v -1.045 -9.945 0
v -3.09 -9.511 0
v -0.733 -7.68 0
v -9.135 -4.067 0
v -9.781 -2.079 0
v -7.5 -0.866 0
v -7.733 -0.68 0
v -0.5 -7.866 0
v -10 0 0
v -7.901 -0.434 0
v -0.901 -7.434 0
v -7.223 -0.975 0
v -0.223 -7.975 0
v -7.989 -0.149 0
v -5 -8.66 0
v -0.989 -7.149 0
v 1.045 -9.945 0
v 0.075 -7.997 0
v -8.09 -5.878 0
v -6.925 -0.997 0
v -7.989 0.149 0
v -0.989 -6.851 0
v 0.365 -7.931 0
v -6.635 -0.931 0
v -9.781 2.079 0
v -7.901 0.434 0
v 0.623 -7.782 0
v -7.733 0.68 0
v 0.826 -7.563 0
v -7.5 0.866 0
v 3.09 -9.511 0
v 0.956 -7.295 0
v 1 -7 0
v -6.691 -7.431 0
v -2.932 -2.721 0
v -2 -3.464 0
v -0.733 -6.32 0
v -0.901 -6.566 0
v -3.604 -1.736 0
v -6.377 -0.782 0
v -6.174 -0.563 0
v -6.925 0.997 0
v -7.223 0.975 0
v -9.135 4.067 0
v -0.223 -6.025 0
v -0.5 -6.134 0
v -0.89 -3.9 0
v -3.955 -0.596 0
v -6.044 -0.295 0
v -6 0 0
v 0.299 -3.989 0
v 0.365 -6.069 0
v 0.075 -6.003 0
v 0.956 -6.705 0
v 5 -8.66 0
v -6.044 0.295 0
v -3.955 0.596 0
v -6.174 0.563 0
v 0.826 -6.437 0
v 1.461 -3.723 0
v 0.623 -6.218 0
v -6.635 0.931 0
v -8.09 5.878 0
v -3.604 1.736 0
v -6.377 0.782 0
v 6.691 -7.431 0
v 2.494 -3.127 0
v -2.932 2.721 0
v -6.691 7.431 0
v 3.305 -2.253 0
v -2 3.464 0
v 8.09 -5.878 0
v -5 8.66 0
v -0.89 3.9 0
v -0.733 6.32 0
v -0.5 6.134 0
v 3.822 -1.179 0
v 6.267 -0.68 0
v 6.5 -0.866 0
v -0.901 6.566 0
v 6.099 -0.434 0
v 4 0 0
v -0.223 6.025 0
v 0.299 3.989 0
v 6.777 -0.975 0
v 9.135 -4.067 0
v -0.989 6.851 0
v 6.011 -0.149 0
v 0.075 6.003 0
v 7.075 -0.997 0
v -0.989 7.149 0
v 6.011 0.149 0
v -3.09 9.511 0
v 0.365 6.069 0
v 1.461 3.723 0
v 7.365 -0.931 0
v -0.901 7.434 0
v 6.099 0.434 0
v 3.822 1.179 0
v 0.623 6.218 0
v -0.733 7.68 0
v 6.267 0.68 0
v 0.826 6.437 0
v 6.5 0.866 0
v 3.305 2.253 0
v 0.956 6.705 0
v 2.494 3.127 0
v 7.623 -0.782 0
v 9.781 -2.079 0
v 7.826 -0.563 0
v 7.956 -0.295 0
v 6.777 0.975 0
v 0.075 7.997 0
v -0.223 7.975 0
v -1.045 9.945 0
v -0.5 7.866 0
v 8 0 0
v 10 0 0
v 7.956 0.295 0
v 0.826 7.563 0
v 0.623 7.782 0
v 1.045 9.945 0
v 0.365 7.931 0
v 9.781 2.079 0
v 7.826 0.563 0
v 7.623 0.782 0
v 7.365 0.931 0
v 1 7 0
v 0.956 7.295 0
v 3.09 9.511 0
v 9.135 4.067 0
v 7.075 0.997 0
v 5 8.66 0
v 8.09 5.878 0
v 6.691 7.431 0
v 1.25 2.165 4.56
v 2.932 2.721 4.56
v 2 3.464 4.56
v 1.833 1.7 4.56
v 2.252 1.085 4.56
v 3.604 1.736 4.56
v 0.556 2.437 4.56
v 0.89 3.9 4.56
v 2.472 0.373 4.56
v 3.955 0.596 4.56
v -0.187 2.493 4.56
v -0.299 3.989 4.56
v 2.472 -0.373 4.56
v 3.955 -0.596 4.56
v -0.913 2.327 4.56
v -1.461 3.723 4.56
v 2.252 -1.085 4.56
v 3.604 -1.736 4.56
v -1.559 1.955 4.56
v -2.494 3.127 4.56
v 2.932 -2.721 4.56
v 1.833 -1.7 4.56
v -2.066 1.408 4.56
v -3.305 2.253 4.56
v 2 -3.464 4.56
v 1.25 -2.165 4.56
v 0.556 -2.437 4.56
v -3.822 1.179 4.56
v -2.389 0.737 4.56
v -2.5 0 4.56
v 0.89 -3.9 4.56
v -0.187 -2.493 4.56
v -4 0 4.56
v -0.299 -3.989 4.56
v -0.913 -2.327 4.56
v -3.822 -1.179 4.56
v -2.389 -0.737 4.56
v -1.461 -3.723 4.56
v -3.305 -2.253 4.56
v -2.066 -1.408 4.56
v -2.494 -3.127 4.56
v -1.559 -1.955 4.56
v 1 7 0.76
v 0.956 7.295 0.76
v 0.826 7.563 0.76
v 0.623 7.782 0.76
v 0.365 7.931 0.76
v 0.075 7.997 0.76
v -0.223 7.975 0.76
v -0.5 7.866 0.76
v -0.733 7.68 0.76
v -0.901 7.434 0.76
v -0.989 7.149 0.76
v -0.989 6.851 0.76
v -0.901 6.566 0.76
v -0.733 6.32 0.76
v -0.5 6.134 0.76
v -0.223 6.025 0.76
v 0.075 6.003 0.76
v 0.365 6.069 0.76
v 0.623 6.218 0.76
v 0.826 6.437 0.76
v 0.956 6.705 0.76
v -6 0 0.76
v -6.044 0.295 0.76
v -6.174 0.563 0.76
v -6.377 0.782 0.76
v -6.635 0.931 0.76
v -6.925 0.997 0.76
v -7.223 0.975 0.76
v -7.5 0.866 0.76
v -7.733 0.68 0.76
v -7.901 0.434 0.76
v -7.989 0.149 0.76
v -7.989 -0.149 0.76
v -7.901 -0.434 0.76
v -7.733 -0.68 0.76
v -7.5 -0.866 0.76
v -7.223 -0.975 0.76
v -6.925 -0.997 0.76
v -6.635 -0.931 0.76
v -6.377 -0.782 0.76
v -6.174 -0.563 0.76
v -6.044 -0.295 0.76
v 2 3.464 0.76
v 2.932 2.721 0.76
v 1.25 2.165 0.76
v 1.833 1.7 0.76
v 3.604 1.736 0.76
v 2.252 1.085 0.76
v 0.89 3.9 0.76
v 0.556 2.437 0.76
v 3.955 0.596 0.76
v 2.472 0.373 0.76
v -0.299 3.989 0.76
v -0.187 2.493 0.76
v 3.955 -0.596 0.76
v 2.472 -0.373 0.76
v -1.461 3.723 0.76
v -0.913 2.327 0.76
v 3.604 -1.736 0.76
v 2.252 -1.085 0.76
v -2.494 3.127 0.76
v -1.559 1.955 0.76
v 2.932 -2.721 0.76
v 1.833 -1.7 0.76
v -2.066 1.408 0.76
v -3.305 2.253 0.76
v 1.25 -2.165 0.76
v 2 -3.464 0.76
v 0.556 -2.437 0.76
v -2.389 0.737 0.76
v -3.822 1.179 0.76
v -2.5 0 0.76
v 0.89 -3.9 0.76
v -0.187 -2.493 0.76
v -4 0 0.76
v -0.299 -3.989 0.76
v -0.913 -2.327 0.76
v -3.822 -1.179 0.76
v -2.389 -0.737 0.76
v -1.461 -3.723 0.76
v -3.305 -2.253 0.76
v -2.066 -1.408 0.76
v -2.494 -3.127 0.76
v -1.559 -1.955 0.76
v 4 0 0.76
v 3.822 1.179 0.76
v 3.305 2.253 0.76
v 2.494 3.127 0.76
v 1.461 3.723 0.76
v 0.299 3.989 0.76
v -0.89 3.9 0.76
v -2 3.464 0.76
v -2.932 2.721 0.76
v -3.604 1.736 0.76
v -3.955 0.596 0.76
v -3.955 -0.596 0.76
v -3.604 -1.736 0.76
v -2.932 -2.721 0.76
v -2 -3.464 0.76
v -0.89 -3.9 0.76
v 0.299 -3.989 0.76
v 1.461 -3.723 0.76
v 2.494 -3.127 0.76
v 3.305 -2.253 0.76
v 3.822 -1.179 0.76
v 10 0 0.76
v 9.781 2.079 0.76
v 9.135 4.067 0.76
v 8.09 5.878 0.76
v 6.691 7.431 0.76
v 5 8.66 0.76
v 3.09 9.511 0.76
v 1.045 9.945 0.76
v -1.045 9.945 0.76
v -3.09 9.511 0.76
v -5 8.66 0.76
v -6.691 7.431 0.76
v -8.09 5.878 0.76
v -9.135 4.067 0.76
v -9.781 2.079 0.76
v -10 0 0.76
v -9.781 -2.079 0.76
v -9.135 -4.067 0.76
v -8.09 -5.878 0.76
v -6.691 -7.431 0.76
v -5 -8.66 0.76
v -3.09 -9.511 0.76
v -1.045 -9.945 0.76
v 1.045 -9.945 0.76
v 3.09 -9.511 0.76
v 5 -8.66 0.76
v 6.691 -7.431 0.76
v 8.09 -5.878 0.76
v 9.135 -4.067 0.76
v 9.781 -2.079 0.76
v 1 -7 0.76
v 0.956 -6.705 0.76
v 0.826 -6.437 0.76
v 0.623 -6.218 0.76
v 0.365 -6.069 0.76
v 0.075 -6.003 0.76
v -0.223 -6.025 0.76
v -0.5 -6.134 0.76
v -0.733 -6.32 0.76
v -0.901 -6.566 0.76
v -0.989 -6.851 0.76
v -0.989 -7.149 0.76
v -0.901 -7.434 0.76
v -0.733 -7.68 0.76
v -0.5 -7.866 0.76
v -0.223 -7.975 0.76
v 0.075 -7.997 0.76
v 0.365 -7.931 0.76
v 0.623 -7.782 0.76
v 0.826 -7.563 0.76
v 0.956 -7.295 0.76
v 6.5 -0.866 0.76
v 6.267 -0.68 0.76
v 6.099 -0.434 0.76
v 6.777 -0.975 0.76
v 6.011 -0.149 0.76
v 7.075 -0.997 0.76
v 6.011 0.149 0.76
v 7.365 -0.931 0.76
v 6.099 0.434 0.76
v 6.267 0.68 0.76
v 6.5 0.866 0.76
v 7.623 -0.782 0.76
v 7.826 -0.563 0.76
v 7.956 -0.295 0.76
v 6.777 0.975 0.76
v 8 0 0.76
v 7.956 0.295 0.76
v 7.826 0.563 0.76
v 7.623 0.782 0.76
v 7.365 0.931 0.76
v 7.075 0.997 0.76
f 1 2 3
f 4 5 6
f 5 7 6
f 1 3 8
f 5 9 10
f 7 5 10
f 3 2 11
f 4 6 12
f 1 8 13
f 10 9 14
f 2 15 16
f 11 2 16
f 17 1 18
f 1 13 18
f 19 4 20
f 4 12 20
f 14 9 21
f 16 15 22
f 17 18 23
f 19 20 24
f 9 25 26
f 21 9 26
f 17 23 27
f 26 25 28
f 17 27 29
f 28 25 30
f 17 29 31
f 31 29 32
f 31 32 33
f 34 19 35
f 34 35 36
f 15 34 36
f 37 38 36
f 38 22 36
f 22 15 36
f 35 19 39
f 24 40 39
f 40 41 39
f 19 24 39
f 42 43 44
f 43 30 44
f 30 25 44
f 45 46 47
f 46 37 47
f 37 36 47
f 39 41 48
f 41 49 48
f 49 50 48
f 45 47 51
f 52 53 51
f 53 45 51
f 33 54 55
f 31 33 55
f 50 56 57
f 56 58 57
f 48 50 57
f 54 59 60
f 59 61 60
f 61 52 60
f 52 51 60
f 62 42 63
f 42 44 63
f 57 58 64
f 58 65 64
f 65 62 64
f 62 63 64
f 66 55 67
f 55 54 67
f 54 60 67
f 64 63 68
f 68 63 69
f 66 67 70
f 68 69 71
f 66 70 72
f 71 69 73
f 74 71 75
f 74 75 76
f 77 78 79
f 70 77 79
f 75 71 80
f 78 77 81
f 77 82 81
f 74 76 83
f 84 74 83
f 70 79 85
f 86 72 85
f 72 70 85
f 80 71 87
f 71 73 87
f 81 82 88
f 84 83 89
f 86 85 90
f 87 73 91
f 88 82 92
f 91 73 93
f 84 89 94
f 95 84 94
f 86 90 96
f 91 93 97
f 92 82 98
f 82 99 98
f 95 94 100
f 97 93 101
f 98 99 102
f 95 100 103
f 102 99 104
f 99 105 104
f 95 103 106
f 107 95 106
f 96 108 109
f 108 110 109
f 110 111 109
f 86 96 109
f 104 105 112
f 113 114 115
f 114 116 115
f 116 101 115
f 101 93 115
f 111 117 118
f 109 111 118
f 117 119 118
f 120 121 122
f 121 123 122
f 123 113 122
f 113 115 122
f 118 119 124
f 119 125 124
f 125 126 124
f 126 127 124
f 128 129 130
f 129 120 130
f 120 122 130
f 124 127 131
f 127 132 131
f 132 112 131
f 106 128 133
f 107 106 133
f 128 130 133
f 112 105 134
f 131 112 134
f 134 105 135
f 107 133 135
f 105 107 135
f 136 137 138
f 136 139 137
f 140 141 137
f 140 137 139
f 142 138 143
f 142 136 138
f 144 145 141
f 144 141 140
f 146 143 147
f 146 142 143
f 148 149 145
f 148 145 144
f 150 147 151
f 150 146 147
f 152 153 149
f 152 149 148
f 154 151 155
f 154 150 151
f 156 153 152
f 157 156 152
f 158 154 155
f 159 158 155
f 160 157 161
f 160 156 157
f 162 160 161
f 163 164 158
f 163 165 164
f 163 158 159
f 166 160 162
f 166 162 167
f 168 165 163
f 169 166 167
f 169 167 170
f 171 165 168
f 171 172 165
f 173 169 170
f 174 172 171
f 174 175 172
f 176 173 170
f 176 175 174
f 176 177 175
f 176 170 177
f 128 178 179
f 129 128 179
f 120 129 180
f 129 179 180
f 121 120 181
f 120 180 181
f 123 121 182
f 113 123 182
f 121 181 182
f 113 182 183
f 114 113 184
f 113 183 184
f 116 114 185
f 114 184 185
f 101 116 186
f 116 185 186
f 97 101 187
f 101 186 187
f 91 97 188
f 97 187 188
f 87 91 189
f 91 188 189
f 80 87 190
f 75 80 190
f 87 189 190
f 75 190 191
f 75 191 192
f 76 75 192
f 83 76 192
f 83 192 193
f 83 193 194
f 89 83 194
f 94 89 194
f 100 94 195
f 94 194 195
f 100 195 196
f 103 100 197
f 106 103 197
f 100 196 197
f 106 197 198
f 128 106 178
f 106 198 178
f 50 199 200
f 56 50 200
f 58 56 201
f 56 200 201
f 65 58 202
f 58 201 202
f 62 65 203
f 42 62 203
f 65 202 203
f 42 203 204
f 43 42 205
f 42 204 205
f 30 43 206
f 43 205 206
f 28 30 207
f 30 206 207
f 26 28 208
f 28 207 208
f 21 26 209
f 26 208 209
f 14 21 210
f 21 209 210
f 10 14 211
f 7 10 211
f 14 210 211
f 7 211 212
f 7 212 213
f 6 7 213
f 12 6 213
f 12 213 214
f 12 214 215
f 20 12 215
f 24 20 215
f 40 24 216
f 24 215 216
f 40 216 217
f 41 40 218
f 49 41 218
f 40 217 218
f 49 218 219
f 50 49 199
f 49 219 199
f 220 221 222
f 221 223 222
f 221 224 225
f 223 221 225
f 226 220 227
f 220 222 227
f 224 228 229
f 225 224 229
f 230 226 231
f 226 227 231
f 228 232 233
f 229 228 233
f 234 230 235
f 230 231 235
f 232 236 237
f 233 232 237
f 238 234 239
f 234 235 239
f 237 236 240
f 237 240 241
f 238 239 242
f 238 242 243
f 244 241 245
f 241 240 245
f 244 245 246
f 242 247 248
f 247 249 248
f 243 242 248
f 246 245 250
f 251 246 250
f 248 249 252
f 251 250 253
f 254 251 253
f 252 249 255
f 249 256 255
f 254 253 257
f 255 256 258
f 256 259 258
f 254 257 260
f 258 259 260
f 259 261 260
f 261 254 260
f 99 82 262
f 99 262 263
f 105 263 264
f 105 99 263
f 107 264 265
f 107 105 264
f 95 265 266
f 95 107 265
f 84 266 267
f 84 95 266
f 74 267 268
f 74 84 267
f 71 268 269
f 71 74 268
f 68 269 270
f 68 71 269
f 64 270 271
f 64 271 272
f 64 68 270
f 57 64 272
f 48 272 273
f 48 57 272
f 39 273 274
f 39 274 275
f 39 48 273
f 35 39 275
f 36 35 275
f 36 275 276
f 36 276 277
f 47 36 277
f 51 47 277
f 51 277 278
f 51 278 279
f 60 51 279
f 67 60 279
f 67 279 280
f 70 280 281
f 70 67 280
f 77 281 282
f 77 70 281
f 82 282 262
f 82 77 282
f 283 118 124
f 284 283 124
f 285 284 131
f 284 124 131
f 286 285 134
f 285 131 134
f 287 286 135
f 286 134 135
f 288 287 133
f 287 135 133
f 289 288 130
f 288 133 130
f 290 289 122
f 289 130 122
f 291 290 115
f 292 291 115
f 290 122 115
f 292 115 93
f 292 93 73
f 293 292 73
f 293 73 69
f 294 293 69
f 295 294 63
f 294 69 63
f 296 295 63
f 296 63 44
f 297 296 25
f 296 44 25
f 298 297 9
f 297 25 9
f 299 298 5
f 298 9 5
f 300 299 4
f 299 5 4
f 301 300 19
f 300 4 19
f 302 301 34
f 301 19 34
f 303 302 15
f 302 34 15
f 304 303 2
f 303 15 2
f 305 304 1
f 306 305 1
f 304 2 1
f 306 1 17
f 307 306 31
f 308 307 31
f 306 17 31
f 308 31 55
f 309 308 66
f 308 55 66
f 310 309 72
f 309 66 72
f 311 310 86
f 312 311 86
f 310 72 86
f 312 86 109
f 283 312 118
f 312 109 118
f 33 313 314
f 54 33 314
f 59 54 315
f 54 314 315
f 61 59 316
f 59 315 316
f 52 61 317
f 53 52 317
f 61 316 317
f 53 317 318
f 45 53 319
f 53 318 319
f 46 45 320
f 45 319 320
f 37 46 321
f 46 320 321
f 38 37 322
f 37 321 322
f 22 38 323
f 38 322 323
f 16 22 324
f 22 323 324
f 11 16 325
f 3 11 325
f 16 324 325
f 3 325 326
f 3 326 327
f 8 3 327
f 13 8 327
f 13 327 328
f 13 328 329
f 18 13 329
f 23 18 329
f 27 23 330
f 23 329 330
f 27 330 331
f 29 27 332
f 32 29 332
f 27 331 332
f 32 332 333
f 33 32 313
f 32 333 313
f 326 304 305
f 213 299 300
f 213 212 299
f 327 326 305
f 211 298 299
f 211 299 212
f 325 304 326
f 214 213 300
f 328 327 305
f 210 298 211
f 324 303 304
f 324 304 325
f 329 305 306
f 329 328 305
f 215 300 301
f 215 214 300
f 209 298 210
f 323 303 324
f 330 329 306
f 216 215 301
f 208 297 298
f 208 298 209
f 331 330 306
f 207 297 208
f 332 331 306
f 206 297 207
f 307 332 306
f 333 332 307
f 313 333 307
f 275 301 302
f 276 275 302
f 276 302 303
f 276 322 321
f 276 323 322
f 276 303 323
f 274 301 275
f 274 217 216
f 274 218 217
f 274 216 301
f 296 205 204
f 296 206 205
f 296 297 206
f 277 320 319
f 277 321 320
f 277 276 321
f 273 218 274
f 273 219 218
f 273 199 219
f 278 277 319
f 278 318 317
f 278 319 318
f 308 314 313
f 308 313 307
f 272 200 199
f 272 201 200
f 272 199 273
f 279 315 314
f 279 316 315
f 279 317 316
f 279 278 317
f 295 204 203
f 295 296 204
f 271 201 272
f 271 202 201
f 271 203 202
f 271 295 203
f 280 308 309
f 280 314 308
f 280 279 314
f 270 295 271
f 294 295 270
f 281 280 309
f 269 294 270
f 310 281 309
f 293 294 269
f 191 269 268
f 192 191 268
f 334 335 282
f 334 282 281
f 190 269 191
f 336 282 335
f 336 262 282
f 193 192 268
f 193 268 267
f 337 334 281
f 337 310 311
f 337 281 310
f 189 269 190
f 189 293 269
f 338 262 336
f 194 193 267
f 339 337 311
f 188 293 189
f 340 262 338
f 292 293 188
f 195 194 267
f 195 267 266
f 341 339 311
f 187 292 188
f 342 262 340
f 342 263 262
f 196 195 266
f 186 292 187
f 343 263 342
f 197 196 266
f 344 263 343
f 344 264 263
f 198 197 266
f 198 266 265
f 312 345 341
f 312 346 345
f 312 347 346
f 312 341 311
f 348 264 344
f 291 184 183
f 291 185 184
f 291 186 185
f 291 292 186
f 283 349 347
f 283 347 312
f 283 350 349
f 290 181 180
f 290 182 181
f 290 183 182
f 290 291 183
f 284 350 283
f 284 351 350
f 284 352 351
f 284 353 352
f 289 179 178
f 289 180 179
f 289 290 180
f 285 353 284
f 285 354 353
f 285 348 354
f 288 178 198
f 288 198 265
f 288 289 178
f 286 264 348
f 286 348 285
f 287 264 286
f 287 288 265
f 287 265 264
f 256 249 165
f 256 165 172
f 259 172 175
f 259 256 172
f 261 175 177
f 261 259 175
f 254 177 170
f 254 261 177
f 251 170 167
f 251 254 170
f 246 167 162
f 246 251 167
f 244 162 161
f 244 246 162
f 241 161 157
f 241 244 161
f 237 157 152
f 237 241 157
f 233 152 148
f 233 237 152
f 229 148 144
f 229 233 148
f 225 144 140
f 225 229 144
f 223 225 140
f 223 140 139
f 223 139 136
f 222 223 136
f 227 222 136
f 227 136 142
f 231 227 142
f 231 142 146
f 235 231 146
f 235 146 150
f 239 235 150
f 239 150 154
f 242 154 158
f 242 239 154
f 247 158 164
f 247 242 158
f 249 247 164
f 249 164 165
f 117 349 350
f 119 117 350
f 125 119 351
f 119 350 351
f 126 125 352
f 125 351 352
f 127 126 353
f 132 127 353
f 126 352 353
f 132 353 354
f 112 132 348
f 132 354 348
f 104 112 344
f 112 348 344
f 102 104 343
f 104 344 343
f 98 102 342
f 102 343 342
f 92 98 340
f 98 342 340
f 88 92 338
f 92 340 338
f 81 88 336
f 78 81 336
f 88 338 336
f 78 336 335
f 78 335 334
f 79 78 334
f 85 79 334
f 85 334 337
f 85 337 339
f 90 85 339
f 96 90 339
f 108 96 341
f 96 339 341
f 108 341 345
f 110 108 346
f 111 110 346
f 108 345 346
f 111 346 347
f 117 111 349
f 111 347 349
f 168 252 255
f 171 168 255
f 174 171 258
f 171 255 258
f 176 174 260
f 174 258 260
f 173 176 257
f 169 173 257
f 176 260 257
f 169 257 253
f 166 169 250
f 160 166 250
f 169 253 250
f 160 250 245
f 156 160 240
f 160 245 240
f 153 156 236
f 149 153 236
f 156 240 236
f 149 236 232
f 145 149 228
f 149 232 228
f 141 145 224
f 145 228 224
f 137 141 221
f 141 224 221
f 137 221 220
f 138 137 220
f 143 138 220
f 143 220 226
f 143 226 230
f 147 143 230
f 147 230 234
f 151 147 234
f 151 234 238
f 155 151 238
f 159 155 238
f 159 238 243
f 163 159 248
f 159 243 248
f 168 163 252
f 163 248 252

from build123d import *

# Parameters (mm, degrees)
IZIM1_R                     = 10
IZIM1_R_2                   = 4
Y_KSEKLIK_EKSTR_ZYON1_DEPTH = 0.76
IZIM2_R                     = 1
KES_EKSTR_ZYON1_DEPTH       = 0.76
IZIM3_R                     = 4
IZIM3_R_2                   = 2.5
Y_KSEKLIK_EKSTR_ZYON2_DEPTH = 3.8


with BuildPart() as part:
    # Çizim1 → Yükseklik-Ekstrüzyon1 (new body)
    with BuildSketch(Plane.XY):
        Circle(IZIM1_R)
        Circle(IZIM1_R_2, mode=Mode.SUBTRACT)
    extrude(amount=Y_KSEKLIK_EKSTR_ZYON1_DEPTH)

    # Çizim2 → Kes-Ekstrüzyon1 (cut)
    with BuildSketch(Plane.XY.offset(0.76)):
        with Locations((-7, 0)):
            Circle(IZIM2_R)
        with Locations((0, 7)):
            Circle(IZIM2_R)
        with Locations((7, 0)):
            Circle(IZIM2_R)
        with Locations((0, -7)):
            Circle(IZIM2_R)
    extrude(amount=-KES_EKSTR_ZYON1_DEPTH, mode=Mode.SUBTRACT)


with BuildPart() as body_2:
    # Çizim3 → Yükseklik-Ekstrüzyon2 (new body)
    with BuildSketch(Plane.XY.offset(0.76)):
        with Locations(Location((0, 0, 0), (0, 0, 180))):
            Circle(IZIM3_R)
        with Locations(Location((0, 0, 0), (0, 0, 180))):
            Circle(IZIM3_R_2, mode=Mode.SUBTRACT)
    extrude(amount=Y_KSEKLIK_EKSTR_ZYON2_DEPTH)


solid = Compound([part.part, body_2.part])
